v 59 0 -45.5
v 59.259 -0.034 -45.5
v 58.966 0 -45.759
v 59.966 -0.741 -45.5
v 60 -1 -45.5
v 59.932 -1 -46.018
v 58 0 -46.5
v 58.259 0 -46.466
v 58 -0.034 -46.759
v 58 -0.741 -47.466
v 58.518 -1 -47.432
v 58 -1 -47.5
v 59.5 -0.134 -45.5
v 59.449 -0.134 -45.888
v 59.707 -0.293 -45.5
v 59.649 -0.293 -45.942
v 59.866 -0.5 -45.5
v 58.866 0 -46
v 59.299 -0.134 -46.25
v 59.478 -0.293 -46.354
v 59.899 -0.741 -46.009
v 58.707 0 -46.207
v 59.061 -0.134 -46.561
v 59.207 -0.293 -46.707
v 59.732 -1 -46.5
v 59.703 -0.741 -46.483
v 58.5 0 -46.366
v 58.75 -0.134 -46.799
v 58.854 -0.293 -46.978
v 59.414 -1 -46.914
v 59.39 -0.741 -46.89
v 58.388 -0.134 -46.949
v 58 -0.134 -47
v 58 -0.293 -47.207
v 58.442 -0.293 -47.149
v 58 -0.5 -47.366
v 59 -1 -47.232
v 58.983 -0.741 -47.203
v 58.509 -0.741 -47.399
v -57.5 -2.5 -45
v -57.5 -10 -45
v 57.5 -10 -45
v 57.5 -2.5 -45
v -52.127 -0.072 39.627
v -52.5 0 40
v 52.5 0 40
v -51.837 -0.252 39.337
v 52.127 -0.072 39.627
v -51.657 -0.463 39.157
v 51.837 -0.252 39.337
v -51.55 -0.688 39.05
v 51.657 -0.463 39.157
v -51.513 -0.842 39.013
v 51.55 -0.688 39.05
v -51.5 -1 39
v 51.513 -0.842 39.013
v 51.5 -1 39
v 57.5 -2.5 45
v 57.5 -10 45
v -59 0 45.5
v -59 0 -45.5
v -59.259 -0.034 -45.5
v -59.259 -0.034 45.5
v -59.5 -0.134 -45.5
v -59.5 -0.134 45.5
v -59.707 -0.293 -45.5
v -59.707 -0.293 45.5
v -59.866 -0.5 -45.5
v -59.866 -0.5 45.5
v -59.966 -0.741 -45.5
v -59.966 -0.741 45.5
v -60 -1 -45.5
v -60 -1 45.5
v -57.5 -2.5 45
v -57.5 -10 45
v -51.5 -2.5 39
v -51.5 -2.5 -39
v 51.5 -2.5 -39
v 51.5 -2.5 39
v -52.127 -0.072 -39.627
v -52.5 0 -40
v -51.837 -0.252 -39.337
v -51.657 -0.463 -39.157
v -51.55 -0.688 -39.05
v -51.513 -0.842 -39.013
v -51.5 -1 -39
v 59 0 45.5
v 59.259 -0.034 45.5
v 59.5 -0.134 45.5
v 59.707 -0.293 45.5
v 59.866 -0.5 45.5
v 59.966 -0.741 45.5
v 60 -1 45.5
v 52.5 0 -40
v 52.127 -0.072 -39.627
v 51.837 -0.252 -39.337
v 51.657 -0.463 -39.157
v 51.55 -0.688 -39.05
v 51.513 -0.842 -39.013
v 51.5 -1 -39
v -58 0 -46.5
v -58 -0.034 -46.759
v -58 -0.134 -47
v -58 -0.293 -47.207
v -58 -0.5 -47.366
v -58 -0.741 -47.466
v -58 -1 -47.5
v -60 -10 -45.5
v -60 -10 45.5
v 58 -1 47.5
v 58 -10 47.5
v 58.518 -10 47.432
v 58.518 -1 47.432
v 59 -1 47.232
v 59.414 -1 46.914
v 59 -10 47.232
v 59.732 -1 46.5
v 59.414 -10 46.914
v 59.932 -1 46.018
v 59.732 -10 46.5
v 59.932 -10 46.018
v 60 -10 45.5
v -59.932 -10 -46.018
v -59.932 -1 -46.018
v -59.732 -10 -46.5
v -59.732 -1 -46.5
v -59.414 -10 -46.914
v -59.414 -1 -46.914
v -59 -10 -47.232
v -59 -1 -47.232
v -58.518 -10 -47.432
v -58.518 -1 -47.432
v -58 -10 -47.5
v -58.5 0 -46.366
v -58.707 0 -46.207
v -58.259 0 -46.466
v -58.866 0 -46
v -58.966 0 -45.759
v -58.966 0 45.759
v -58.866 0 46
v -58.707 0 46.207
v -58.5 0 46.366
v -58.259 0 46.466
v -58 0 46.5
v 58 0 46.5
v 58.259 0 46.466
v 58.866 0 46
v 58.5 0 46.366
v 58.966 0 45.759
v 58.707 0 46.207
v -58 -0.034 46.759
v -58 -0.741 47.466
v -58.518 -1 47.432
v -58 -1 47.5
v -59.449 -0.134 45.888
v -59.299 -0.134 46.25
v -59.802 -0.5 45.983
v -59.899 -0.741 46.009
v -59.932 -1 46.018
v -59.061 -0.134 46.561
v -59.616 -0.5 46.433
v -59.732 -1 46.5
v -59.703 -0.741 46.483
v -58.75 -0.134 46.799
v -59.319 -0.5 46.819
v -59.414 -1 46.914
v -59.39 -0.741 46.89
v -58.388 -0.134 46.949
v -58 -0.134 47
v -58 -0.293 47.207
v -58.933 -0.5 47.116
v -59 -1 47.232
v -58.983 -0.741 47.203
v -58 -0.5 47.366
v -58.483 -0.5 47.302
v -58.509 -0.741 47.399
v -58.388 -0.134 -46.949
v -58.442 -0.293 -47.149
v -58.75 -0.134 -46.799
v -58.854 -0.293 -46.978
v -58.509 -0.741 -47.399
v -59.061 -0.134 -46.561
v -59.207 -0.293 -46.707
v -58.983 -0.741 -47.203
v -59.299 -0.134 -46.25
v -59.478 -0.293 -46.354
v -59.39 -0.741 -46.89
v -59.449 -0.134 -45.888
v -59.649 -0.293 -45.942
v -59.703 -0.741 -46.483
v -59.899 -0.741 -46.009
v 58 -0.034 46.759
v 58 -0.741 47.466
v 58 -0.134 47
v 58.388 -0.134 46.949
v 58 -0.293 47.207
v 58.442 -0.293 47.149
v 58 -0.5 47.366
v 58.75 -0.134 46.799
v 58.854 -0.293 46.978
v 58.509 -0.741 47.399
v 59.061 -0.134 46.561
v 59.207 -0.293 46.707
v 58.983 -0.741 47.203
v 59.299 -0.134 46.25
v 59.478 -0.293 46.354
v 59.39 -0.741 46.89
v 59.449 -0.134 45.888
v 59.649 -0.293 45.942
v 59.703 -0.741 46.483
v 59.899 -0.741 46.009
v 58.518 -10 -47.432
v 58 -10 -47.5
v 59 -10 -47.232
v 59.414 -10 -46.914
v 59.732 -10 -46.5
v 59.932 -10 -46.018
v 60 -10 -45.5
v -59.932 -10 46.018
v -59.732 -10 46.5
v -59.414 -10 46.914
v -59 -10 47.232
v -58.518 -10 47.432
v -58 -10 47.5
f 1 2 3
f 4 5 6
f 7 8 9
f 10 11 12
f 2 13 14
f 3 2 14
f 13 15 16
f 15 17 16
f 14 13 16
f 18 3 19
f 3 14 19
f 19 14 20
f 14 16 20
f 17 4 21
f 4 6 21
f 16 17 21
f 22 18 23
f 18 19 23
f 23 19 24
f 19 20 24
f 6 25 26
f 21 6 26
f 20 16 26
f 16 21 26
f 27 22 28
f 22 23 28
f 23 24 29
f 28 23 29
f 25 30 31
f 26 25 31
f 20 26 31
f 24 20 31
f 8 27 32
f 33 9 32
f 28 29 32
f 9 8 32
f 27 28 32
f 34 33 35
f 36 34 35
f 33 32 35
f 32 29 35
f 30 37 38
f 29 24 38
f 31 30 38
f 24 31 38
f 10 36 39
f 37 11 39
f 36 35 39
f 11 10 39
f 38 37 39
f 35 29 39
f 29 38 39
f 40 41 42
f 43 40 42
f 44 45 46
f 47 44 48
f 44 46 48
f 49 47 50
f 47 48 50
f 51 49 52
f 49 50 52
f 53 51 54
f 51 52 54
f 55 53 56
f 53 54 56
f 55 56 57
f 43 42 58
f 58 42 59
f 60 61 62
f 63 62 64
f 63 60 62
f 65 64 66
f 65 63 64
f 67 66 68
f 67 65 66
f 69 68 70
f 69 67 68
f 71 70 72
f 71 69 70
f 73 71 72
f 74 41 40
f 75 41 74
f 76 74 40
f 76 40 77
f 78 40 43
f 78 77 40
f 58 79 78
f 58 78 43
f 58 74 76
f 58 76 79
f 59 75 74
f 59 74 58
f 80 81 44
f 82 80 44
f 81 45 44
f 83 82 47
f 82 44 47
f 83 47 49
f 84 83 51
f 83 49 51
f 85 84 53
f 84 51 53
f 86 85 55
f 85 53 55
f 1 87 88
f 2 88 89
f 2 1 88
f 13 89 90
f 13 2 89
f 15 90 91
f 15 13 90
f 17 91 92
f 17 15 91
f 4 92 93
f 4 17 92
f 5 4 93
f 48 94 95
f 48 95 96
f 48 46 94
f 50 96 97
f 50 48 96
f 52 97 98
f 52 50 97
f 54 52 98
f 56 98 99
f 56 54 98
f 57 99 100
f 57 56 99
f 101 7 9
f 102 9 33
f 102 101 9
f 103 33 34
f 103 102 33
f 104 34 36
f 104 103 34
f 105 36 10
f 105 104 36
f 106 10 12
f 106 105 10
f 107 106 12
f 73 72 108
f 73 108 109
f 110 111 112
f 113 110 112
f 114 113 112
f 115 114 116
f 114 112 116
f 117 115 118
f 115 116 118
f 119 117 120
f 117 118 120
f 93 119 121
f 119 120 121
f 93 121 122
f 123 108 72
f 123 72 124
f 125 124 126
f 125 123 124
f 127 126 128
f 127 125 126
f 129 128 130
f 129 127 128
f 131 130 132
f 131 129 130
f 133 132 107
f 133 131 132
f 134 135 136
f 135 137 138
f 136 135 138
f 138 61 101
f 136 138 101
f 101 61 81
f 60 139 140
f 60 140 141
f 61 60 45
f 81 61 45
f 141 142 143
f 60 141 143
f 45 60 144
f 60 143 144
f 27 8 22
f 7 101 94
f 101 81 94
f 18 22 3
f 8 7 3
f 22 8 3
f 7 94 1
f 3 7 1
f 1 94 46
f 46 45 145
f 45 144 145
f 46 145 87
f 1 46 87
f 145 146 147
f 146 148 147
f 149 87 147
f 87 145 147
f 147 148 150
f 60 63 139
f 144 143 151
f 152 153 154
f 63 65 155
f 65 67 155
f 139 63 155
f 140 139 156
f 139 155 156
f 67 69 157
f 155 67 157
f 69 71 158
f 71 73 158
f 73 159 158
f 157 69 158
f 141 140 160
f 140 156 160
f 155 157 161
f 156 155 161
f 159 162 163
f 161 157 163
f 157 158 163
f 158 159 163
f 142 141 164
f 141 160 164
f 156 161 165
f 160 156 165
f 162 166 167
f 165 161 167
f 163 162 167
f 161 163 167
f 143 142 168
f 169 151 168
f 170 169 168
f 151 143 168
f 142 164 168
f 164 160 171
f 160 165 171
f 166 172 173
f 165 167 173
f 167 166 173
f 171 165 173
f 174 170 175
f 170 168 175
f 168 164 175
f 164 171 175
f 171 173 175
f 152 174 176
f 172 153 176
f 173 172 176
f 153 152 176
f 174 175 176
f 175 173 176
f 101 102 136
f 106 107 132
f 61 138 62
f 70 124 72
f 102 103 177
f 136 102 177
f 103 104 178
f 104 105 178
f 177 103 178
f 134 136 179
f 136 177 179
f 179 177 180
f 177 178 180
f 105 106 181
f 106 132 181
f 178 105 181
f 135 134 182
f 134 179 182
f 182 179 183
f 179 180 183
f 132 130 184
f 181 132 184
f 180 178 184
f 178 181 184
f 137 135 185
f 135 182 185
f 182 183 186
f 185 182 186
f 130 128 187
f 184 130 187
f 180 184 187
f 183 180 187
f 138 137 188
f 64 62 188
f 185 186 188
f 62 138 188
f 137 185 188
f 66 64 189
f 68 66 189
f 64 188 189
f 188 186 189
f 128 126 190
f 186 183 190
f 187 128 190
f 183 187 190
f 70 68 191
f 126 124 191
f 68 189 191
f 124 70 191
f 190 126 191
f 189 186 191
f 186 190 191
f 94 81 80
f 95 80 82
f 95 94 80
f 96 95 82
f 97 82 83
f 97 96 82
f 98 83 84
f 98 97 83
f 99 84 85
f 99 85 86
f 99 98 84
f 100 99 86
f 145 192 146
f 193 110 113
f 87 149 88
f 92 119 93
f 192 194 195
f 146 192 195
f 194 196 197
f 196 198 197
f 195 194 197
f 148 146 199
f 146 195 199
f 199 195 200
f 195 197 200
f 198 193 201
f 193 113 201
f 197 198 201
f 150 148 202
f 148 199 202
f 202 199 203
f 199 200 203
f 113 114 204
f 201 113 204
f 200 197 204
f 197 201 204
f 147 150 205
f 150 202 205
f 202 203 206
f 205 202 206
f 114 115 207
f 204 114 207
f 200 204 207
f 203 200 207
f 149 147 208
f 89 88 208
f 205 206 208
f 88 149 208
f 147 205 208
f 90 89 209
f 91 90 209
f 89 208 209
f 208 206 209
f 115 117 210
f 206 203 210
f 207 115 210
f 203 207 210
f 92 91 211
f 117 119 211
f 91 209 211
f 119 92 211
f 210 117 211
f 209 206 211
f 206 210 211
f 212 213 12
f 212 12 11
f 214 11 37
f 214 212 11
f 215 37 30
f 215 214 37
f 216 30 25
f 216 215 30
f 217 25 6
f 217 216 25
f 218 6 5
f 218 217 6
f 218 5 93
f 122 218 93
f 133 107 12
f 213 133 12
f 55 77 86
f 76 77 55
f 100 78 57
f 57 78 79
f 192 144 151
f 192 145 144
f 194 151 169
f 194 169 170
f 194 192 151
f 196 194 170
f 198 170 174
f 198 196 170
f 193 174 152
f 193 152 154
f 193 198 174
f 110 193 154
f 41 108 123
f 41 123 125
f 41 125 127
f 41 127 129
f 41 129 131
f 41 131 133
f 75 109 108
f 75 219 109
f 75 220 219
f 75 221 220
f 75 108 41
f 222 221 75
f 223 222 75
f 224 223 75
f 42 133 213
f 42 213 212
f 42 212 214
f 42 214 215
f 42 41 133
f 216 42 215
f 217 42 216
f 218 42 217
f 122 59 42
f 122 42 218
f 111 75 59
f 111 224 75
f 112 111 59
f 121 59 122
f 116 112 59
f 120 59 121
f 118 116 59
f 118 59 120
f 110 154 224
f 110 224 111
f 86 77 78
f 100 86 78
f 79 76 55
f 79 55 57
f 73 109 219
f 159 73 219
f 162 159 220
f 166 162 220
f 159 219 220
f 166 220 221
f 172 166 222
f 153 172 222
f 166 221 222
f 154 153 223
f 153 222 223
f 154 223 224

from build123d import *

# Parameters (mm, degrees)
F0_W     = 120
F0_H     = 95
F1_DEPTH = 10
F2_W     = 115
F2_H     = 90
F3_DEPTH = 7.5
F4_W     = 103
F4_H     = 78
F5_DEPTH = 2.501
F6_R     = 2
F7_R     = 1


with BuildPart() as f1:
    # F0 (on Front) → F1 (new body)
    with BuildSketch(Plane.XZ):
        Rectangle(F0_W, F0_H)
    extrude(amount=F1_DEPTH)

    # F2 (on face) → F3 (cut)
    with BuildSketch(Plane.XZ.offset(10)):
        Rectangle(F2_W, F2_H)
    extrude(amount=-F3_DEPTH, mode=Mode.SUBTRACT)

    # F4 (on face) → F5 (cut, through all)
    with BuildSketch(Plane.XZ.offset(2.5)):
        Rectangle(F4_W, F4_H)
    extrude(amount=-F5_DEPTH, mode=Mode.SUBTRACT)

    # F6
    f6_edges = [f1.edges().sort_by_distance(p)[0] for p in [
        (60, -5, 47.5),
        (60, -5, -47.5),
        (-60, -5, -47.5),
        (-60, -5, 47.5),
    ]]
    fillet(f6_edges, radius=F6_R)

    # F7
    f7_edges = [f1.edges().sort_by_distance(p)[0] for p in [
        (0, 0, 47.5),
        (59.414214, 0, 46.914214),
        (-59.414214, 0, 46.914214),
        (60, 0, 0),
        (-60, 0, 0),
        (59.414214, 0, -46.914214),
        (-59.414214, 0, -46.914214),
        (0, 0, -47.5),
        (0, 0, 39),
        (-51.5, 0, 0),
        (0, 0, -39),
        (51.5, 0, 0),
    ]]
    fillet(f7_edges, radius=F7_R)


solid = f1.part
